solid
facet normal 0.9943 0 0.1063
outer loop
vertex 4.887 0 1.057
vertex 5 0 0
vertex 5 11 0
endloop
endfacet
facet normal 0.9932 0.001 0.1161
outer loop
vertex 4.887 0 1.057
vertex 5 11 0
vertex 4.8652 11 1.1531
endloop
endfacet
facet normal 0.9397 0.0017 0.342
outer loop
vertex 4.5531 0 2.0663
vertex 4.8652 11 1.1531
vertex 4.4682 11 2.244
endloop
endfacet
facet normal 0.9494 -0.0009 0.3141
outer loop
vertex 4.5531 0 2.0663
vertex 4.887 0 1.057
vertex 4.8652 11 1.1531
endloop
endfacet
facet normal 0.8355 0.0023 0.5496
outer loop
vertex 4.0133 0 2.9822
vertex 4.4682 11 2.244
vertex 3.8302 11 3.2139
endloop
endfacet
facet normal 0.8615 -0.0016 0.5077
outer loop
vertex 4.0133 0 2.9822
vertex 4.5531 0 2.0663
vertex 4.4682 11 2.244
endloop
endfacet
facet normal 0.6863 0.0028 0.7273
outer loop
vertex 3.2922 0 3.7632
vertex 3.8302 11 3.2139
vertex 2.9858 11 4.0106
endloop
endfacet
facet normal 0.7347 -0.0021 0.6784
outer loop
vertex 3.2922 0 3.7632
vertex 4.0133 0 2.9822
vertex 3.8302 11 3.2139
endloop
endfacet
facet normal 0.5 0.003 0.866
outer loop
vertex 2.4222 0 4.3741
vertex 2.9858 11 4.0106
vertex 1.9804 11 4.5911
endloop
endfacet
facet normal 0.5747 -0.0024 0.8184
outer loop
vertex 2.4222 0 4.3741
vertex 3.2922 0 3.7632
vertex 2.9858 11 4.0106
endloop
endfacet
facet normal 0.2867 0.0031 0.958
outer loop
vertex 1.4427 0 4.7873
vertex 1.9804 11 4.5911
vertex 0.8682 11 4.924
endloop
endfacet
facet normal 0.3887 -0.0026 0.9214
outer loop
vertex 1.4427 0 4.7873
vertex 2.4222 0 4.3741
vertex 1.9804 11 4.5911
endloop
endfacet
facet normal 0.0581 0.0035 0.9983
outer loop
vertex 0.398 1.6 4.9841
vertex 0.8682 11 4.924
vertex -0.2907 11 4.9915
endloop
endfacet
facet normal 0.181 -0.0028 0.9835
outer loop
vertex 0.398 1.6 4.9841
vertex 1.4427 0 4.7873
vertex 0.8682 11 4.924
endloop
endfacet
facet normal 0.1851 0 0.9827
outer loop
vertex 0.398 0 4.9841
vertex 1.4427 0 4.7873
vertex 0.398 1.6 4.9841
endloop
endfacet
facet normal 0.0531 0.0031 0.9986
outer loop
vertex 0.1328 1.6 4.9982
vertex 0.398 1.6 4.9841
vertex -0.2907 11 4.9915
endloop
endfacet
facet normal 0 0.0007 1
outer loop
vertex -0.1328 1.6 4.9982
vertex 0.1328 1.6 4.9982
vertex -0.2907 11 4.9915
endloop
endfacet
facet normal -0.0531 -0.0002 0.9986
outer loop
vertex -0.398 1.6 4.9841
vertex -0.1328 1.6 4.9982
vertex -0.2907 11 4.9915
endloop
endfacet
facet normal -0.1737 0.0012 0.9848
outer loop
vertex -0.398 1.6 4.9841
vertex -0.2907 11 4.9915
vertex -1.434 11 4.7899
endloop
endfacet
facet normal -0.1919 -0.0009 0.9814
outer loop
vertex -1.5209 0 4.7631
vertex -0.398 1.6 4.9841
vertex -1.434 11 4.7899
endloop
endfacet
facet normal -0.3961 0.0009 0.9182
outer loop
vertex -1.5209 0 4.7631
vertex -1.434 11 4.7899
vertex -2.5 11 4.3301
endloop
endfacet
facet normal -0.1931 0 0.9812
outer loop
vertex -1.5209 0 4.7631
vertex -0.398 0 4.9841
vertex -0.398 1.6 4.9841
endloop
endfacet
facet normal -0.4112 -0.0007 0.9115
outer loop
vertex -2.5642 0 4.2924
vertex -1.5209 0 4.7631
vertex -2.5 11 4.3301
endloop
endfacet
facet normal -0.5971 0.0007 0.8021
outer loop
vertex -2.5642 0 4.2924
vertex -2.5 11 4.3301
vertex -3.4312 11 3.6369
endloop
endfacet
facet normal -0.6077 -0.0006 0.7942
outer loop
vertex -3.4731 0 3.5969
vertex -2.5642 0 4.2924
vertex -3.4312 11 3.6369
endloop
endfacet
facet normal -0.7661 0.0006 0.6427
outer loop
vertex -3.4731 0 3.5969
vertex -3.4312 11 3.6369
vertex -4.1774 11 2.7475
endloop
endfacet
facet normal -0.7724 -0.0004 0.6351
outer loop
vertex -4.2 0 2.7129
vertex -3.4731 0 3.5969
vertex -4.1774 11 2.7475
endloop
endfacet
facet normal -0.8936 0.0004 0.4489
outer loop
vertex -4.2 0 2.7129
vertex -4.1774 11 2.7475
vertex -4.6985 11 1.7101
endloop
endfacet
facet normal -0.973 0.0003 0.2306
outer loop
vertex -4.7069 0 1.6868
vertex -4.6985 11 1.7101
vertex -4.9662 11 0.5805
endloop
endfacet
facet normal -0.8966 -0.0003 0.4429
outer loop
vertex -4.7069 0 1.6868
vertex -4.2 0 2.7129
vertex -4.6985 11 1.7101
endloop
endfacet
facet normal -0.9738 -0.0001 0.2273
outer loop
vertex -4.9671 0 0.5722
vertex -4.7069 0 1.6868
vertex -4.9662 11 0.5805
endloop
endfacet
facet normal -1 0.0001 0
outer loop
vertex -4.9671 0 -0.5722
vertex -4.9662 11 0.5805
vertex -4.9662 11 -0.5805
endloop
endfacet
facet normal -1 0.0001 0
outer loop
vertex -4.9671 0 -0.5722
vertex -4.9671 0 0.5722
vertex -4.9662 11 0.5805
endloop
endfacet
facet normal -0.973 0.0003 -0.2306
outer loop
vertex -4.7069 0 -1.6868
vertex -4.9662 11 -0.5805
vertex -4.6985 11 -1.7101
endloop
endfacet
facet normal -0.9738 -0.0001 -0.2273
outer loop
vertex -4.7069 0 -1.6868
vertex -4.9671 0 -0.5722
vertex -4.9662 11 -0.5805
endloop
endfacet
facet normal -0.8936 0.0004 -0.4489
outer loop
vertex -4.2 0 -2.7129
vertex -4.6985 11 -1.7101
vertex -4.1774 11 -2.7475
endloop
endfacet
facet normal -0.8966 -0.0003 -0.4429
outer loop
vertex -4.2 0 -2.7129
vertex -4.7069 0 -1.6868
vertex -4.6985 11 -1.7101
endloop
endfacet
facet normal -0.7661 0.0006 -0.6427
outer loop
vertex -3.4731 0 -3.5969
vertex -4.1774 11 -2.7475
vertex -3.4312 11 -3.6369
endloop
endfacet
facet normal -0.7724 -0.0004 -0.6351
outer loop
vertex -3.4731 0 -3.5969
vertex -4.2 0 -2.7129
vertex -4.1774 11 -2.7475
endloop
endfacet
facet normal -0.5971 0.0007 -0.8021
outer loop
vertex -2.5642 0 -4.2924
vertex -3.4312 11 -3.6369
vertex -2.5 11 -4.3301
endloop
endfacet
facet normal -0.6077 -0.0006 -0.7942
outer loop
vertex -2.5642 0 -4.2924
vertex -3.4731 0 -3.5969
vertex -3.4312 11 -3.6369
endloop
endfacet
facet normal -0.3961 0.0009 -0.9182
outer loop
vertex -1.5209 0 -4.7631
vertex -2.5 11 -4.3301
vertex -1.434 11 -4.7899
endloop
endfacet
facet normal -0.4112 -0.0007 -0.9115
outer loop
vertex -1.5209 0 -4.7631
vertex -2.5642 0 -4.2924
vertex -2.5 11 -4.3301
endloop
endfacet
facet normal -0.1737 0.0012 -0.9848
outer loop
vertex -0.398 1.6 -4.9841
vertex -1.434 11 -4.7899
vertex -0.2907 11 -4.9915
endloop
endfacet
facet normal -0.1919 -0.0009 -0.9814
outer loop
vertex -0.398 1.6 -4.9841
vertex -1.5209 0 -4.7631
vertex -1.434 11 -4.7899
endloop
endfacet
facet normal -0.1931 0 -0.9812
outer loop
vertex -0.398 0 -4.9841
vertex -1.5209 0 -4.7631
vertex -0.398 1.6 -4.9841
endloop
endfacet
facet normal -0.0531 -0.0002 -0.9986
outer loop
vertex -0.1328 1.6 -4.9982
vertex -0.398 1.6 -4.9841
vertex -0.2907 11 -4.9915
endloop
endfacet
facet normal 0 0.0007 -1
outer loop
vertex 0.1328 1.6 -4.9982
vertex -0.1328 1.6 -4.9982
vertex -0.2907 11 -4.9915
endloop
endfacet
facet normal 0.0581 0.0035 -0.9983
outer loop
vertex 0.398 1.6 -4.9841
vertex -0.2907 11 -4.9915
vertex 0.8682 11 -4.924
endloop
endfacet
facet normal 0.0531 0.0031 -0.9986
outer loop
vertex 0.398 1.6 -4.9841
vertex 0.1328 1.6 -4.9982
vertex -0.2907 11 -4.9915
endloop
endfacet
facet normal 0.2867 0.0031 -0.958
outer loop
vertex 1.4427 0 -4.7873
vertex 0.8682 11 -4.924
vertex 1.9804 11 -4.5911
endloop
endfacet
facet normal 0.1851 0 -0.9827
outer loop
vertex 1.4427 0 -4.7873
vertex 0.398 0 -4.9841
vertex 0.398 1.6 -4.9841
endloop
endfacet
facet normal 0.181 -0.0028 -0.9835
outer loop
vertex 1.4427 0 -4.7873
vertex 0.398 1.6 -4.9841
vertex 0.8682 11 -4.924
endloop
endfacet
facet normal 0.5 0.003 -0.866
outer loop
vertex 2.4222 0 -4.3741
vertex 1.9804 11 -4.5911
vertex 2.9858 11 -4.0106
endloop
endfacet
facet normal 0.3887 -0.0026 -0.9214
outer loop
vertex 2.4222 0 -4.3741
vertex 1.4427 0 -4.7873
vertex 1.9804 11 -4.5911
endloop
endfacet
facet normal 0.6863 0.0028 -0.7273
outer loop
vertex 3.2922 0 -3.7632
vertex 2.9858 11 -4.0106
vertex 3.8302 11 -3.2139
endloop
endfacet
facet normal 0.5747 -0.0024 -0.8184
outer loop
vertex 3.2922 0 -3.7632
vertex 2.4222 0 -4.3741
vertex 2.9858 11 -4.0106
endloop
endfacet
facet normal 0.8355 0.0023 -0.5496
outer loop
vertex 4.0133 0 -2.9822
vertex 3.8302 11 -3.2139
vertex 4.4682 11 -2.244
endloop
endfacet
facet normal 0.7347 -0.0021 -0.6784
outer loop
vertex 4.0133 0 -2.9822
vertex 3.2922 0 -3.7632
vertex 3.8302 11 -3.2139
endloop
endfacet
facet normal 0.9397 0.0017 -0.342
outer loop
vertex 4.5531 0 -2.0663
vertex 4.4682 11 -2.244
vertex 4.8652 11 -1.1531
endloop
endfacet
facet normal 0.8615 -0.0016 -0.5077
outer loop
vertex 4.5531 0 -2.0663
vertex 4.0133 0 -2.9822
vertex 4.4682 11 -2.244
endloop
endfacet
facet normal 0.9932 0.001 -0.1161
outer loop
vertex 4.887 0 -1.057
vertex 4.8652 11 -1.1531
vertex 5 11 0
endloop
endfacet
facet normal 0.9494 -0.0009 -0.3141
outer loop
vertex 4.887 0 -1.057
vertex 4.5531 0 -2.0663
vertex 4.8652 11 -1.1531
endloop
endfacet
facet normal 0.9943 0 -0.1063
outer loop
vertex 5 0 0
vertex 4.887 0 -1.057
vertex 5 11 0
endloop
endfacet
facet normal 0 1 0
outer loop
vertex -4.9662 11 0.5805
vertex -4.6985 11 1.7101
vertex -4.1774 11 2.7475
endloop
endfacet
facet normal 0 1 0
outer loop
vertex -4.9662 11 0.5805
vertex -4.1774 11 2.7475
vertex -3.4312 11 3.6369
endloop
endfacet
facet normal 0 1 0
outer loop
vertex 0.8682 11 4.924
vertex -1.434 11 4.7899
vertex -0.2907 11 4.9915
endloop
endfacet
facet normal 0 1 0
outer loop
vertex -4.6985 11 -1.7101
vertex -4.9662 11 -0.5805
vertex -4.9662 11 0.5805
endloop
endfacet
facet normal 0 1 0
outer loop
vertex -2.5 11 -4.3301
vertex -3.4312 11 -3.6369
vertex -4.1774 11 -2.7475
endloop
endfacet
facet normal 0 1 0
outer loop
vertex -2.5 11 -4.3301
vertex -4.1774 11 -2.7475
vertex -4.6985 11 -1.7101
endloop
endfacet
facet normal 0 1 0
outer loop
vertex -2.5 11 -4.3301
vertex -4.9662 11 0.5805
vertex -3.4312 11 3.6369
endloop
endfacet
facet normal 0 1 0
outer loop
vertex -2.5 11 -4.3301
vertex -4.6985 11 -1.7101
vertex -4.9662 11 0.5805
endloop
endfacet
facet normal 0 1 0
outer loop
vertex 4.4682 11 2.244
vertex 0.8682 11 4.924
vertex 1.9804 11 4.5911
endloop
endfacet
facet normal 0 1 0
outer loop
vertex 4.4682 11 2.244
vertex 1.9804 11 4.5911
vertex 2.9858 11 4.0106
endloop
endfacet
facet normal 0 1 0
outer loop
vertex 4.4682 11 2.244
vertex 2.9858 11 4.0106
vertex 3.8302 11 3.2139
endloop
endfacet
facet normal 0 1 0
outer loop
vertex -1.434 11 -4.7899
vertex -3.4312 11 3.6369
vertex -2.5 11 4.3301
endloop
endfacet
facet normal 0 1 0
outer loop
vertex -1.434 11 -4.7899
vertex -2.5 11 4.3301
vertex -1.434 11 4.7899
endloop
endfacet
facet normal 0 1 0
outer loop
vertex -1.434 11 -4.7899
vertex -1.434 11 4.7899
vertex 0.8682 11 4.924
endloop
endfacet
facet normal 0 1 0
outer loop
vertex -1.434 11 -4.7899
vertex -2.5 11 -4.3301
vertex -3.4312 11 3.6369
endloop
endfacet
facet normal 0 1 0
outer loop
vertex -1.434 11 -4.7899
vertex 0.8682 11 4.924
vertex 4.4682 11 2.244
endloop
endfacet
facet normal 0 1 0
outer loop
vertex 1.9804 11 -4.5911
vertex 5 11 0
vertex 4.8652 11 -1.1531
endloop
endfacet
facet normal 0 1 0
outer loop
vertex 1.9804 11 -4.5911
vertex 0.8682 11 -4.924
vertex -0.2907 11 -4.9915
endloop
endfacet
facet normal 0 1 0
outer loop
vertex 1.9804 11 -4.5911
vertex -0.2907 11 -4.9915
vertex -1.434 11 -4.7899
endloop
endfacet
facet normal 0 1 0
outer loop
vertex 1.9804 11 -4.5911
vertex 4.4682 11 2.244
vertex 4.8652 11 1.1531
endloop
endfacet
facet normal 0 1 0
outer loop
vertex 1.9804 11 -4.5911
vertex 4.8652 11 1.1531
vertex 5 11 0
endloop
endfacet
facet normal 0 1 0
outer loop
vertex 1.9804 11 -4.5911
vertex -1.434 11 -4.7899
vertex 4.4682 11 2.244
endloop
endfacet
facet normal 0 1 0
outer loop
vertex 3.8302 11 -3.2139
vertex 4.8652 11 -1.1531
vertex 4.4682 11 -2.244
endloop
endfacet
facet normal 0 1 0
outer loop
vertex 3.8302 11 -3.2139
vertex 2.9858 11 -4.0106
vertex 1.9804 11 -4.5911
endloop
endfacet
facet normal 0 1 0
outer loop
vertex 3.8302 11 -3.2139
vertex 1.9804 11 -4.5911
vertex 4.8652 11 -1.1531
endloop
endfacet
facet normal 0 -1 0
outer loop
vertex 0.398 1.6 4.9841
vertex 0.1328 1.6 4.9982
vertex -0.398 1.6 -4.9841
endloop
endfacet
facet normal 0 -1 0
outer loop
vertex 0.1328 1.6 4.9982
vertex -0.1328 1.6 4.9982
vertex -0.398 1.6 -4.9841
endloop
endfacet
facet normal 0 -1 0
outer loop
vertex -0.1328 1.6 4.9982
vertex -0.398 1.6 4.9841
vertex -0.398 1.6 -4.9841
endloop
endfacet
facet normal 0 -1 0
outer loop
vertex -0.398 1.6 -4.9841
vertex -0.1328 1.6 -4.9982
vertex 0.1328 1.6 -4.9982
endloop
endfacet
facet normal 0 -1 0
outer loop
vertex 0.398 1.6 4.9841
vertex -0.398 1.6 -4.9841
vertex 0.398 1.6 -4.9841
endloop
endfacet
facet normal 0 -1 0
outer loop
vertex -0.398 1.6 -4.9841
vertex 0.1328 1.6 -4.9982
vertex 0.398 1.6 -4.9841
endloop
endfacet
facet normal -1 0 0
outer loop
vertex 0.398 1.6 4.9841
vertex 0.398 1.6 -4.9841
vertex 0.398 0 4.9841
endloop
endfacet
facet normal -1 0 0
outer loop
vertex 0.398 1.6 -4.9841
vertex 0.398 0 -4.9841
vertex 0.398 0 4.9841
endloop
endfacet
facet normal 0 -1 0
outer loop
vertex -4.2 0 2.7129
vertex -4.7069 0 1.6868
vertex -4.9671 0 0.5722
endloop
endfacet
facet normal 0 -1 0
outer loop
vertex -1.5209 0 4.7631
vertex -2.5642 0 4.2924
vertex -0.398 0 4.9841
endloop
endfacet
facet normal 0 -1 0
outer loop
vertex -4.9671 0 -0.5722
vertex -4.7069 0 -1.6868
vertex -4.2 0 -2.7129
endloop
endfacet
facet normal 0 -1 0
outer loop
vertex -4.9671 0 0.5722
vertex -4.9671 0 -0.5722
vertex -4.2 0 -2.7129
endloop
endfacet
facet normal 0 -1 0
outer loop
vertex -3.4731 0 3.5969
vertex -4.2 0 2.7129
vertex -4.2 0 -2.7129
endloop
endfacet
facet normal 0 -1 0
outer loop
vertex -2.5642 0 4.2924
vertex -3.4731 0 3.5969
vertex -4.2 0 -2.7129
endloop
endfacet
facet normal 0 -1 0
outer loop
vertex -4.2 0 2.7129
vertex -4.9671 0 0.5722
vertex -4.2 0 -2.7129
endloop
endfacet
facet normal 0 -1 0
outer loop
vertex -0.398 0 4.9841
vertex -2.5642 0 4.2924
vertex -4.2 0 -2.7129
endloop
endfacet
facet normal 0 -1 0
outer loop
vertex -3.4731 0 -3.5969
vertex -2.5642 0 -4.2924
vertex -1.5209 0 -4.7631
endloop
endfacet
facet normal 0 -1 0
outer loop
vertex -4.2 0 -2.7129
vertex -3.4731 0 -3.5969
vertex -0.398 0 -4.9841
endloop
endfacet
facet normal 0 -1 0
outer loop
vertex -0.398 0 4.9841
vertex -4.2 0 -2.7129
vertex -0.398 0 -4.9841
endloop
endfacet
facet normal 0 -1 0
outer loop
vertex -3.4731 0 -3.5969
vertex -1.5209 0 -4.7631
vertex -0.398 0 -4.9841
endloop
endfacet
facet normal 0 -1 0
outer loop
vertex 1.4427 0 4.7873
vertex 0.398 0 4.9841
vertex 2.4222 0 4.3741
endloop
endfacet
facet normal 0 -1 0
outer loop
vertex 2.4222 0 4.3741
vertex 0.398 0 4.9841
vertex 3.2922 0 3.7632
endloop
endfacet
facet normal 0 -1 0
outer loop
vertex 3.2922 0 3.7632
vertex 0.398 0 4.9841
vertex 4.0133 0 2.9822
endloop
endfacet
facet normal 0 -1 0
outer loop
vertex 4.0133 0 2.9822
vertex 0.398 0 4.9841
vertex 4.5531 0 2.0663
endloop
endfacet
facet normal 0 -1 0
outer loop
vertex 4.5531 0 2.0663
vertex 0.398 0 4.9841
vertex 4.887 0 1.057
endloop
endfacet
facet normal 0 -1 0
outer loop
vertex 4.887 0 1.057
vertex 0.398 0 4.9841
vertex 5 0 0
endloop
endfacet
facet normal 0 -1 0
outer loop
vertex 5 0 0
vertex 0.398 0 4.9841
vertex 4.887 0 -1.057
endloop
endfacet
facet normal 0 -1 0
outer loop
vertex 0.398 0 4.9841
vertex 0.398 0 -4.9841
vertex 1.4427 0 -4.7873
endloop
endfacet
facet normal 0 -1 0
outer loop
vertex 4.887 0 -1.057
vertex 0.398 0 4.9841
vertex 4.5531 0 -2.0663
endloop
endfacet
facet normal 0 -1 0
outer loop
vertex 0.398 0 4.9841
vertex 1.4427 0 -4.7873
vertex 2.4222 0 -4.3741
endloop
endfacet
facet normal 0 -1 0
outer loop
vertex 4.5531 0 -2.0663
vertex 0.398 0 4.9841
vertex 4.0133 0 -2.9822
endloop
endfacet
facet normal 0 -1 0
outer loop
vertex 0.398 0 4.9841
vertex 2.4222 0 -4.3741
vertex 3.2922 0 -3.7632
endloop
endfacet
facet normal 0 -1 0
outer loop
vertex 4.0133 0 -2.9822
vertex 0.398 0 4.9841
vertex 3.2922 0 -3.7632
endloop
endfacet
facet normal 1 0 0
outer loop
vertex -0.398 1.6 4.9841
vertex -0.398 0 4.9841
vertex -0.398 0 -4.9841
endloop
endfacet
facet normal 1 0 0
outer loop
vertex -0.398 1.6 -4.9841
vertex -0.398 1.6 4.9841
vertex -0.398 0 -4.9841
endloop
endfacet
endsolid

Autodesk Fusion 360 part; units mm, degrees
sketch "Sketch1" plane through (0, 0, 0) normal (0, 1, 0) x (1, 0, 0)
  circle A0 centre (0, 0) radius 5
  dimension "d1" = 10
extrude "Extrude1" add sketch "Sketch1" along normal blind 11
sketch "Sketch2" plane through (0, 0, 0) normal (1, 0, 0) x (0, 1, 0)
sketch "Sketch3" plane through (0, 0, 0) normal (0, 1, 0) x (1, 0, 0)
  circle A0 centre (0, 0) radius 5
  line L0 (-0.398, -4.9841) -> (-0.398, 4.9841)
  line L1 (0.398, 4.9841) -> (0.398, -4.9841)
  line L2 (-0.398, -4.9841) -> (-0.398, -5.1)
  line L3 (-0.398, -5.1) -> (0.4, -5.1)
  line L4 (0.4, -5.1) -> (0.398, -4.9841)
  line L5 (0.398, 4.9841) -> (0.398, 5.2684)
  line L6 (0.398, 5.2684) -> (-0.5, 5.2684)
  line L7 (-0.5, 5.2684) -> (-0.398, 4.9841)
extrude "Extrude2" cut sketch "Sketch3" along normal blind 1.6 contours A0 L0 L1 | A0 L5 L6 L7 | A0 L2 L3 L4
